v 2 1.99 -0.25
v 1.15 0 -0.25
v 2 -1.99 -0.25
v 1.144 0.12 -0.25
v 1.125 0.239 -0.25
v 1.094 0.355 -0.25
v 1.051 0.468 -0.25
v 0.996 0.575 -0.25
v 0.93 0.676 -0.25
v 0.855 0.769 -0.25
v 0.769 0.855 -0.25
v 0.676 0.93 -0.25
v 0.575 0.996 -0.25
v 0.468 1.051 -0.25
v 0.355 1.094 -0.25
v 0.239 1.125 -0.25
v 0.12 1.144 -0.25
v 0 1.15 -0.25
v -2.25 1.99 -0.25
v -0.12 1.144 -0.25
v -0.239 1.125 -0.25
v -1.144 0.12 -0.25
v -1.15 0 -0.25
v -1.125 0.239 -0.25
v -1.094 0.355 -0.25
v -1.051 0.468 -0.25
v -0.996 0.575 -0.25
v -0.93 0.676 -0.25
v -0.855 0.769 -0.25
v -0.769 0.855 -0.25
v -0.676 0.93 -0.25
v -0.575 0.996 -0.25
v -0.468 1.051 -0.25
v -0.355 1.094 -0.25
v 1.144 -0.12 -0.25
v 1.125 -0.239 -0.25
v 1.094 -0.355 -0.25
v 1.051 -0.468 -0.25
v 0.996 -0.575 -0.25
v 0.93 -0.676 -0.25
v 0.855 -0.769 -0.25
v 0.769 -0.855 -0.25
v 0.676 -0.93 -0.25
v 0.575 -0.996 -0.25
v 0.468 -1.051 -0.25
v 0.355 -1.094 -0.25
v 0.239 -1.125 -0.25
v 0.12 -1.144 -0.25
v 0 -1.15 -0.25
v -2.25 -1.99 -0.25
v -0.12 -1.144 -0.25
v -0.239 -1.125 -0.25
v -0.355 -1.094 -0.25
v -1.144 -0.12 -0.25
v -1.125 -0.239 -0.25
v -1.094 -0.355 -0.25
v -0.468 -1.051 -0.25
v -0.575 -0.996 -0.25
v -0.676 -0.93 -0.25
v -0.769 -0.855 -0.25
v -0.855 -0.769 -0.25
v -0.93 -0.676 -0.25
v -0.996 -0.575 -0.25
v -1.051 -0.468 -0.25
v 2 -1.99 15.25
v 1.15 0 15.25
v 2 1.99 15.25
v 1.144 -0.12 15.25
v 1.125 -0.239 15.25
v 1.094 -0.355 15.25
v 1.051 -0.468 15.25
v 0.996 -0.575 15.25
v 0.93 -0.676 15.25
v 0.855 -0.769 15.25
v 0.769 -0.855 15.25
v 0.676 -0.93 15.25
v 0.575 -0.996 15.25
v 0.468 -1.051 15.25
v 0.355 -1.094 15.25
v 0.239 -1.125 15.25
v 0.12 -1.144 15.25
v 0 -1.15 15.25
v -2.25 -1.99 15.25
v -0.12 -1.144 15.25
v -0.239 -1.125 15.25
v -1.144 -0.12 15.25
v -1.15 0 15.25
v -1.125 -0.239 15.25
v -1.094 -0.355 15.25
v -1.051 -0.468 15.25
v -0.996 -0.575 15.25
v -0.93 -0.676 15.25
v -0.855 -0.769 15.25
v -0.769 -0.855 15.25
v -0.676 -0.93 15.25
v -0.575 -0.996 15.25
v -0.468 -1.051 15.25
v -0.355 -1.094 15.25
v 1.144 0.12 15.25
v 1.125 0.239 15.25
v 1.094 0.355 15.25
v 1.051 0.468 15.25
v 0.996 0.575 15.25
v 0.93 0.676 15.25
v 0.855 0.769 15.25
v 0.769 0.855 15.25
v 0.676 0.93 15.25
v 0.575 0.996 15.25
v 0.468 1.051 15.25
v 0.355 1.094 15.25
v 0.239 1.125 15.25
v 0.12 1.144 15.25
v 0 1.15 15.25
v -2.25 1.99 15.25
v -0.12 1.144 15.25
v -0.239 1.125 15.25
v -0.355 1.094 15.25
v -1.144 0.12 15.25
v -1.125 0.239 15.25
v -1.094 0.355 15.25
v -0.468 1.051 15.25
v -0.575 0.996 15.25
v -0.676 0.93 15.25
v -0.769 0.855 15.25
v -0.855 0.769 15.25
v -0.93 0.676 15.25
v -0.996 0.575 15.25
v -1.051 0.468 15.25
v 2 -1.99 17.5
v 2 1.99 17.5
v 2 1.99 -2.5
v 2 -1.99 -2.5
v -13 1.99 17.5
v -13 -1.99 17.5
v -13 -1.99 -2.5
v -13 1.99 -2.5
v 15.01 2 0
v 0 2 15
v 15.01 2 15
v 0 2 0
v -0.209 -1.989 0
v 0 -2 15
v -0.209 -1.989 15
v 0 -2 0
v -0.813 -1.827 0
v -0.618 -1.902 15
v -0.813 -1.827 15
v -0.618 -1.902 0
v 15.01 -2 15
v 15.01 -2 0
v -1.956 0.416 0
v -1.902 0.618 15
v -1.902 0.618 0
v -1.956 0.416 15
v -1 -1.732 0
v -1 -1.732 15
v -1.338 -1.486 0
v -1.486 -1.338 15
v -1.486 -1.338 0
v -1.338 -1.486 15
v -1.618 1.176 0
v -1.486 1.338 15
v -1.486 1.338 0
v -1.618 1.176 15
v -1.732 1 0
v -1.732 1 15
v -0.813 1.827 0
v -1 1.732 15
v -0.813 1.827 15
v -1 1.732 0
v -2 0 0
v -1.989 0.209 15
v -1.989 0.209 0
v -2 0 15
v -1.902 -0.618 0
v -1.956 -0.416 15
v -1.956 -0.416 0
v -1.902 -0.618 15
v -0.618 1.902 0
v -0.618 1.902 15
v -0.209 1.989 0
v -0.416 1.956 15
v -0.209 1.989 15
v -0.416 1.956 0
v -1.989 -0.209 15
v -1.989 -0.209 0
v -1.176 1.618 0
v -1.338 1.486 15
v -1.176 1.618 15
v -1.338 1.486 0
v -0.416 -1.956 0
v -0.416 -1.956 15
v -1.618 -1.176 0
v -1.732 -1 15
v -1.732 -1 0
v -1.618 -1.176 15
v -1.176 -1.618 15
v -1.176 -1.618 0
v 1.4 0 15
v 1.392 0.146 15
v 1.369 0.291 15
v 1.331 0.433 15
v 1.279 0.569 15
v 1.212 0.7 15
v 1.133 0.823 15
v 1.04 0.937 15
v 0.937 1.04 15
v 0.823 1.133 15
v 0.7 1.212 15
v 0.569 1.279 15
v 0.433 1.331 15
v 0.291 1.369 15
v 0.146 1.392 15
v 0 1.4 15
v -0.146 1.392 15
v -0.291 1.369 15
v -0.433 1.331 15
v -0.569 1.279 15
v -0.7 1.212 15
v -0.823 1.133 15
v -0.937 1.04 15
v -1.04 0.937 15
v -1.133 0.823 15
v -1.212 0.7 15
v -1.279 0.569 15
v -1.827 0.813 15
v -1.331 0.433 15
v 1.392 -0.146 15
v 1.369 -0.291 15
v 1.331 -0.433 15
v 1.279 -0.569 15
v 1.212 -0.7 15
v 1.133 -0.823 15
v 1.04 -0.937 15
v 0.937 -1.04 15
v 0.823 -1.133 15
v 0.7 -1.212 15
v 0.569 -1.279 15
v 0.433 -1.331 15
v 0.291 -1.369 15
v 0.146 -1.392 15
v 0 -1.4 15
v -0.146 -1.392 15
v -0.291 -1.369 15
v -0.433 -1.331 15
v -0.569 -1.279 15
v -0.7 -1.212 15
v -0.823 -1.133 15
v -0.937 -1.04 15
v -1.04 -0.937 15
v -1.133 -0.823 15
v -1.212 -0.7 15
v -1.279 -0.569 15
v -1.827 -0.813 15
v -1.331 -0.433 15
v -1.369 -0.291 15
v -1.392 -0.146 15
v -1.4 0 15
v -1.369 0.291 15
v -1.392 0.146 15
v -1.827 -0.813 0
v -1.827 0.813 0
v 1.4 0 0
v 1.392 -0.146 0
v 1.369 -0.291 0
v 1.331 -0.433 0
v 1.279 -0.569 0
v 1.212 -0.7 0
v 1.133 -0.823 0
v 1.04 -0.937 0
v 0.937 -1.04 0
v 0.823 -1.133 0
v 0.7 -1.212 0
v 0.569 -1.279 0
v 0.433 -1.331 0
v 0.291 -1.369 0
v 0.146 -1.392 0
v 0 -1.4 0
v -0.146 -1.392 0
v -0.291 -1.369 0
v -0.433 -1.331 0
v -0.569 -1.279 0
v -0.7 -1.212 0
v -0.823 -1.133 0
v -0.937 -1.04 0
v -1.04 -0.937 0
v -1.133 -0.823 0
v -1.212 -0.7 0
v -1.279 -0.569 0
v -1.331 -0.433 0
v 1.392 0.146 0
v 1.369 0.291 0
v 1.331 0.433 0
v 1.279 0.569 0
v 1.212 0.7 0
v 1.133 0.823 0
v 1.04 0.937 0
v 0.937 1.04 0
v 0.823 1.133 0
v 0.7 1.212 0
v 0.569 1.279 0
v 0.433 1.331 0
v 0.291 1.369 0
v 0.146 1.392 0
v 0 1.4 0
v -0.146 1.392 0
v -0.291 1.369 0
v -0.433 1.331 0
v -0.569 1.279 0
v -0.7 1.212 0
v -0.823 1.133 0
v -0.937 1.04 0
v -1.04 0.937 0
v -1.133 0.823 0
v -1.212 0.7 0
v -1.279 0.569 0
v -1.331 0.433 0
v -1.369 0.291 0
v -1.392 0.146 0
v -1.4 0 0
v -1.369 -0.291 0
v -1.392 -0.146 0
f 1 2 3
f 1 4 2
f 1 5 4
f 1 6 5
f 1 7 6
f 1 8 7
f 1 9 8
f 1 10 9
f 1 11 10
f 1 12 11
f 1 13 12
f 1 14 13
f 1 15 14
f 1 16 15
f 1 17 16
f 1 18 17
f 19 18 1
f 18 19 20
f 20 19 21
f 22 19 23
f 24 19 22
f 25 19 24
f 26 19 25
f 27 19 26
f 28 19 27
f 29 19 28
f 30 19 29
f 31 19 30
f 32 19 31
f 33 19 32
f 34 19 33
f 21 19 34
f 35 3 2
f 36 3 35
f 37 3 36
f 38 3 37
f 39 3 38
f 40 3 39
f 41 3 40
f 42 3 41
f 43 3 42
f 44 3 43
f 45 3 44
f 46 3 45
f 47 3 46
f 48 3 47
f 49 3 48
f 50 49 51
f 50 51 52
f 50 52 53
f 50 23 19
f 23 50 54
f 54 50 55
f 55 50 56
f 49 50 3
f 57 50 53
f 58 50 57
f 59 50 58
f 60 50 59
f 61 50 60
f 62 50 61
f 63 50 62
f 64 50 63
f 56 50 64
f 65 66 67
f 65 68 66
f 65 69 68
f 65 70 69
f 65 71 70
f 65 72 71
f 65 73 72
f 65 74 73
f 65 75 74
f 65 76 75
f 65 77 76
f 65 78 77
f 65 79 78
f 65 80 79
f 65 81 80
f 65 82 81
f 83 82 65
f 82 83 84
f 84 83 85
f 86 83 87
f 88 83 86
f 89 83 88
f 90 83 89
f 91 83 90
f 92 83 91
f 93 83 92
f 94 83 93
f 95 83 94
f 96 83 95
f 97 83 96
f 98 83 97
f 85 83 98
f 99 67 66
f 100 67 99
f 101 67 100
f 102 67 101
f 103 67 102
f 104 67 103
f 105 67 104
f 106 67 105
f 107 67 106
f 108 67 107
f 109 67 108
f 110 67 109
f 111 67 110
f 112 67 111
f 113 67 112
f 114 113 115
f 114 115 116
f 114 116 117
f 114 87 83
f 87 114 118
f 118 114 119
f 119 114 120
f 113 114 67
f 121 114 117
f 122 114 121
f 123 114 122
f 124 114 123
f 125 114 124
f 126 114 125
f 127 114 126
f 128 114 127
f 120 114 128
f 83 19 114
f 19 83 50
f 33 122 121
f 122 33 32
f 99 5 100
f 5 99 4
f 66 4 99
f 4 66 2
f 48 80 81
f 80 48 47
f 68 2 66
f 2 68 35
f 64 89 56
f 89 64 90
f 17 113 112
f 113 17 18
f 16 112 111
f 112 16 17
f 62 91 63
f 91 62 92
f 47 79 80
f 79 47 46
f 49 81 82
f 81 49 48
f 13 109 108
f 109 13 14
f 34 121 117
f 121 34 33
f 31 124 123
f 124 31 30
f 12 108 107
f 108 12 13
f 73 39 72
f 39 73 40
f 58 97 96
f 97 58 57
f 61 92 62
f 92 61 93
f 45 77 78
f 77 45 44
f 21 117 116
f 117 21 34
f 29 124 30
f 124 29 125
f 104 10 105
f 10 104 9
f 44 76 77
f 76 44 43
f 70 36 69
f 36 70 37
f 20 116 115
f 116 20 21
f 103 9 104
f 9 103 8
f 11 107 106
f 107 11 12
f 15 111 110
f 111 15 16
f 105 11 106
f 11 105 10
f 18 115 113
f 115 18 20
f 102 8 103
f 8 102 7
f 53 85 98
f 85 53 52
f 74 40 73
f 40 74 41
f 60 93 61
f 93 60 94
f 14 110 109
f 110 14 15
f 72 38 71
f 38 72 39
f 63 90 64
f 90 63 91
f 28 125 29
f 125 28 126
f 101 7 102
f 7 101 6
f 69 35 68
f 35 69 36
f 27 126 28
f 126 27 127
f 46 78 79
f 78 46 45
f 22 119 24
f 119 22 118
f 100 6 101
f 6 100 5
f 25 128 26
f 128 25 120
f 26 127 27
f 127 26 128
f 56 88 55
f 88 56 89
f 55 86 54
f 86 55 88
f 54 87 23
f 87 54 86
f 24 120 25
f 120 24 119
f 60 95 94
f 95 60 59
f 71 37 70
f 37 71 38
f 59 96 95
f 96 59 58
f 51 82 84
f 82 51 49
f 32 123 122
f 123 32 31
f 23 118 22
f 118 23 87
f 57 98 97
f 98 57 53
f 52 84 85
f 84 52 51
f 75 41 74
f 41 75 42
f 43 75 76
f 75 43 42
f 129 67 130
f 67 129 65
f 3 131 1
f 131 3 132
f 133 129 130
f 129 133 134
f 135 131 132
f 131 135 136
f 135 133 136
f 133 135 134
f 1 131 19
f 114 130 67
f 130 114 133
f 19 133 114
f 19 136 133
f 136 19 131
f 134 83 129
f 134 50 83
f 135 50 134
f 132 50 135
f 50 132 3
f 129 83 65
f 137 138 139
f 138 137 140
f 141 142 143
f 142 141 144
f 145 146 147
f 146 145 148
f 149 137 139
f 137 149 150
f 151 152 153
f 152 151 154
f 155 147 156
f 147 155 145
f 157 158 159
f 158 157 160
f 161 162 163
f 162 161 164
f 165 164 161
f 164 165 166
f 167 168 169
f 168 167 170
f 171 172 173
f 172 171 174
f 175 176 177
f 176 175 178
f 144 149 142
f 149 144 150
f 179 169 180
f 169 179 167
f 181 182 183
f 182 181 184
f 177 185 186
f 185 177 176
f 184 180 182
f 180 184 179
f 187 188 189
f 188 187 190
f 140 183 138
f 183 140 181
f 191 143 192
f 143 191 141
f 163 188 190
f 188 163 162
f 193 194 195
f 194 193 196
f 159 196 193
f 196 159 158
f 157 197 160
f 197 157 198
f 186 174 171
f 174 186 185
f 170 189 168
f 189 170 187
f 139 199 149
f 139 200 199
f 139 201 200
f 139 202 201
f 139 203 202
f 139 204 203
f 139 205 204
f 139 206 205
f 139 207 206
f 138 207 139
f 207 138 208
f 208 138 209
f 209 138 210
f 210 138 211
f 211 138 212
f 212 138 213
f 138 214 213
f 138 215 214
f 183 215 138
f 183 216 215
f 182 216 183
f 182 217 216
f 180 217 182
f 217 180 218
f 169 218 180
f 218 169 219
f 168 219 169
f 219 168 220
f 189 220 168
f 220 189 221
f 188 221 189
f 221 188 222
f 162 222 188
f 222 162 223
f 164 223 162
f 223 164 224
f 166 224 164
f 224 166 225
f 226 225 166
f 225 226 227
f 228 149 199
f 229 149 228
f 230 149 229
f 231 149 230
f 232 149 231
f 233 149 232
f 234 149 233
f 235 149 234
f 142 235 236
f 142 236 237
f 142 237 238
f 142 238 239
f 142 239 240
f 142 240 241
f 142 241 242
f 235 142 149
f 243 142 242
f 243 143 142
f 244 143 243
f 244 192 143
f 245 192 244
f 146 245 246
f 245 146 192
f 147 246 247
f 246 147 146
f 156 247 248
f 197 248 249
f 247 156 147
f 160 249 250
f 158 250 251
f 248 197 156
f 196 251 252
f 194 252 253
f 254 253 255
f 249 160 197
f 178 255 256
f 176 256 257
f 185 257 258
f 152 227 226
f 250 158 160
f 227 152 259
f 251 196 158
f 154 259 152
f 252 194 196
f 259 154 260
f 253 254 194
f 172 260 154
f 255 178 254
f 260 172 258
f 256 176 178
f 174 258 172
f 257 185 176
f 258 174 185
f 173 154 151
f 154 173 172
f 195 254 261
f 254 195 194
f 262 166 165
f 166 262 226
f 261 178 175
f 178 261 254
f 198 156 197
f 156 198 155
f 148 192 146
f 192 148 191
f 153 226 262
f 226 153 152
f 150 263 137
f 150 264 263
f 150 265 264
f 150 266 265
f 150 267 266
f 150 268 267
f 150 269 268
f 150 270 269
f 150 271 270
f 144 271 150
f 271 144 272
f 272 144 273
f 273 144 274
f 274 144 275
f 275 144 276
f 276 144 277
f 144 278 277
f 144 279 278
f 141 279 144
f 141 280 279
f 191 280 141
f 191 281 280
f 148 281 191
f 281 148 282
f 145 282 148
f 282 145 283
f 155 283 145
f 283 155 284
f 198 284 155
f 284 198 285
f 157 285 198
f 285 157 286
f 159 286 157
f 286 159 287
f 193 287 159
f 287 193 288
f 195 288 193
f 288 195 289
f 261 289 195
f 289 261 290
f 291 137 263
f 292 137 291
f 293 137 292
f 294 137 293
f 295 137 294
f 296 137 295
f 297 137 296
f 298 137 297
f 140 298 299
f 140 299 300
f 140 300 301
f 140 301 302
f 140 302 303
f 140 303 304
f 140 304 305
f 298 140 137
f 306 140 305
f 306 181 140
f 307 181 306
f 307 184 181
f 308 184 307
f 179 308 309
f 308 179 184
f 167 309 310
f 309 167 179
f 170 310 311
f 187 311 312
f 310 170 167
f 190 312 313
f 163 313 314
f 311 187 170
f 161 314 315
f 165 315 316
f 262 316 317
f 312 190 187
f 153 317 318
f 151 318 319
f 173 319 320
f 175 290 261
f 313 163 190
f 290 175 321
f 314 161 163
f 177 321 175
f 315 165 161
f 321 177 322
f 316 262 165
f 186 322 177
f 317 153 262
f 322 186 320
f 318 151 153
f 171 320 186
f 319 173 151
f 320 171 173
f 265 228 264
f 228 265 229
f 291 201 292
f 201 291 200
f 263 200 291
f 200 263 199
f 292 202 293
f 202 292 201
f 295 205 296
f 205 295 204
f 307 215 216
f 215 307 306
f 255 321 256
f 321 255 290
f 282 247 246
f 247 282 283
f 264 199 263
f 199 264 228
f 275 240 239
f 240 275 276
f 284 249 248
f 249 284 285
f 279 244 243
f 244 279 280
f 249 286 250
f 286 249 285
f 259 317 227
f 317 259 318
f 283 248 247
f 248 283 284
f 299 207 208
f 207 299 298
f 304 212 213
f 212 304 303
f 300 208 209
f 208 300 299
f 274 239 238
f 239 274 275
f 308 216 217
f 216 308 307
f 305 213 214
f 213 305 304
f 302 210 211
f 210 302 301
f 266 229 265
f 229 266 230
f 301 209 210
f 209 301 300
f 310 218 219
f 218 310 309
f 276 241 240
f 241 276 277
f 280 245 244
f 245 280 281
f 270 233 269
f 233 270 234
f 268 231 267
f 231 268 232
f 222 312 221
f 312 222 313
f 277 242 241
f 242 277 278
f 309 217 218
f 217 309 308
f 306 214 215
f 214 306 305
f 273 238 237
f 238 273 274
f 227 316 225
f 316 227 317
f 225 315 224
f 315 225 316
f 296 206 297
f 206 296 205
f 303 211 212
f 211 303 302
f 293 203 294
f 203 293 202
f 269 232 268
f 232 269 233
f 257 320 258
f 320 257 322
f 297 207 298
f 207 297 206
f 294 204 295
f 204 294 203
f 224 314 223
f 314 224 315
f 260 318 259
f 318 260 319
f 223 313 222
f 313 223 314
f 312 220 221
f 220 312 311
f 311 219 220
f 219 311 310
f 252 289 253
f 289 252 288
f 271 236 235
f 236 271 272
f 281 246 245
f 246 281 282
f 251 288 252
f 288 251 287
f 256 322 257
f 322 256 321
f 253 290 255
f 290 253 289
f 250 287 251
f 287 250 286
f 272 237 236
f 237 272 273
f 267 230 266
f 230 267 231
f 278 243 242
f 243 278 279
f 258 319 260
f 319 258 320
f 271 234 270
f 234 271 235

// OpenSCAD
$fn=60;
e=0.01;

clearance=0.25;
wide=15;
outer_wide=wide + 5;
long=15;
thick=4;
hole_dia=thick * 0.7;

module hinge_part(clearance=0, flat_front=false) {
  w = wide + 2*clearance;
  t = thick + 2*clearance;
  translate([0, 0, -clearance]) difference() {
    hull() {
      cylinder(r=t/2, h=wide+2*clearance);
      translate([long, -t/2, 0]) cube([e, t, w]);
      if (flat_front) {
	translate([-t/2, -t/2, 0]) cube([e, t, w]);
      }
    }
    translate([0, 0, -e]) cylinder(r=hole_dia/2-clearance, h=w+2*e);
  }
}

module assembly() {
  if (true) difference() {
      color("red") translate([-long+2, -thick/2+e, -(outer_wide-wide)/2]) cube([long, thick-2*e, outer_wide]);
      hinge_part(clearance=clearance, flat_front=true);
    }

  rotate([0, 0, 0]) hinge_part();
}

module xray() {
  difference() {
    assembly();
    translate([-5, -10, 6]) cube([100, 100, 100]);
  }
}

assembly();
